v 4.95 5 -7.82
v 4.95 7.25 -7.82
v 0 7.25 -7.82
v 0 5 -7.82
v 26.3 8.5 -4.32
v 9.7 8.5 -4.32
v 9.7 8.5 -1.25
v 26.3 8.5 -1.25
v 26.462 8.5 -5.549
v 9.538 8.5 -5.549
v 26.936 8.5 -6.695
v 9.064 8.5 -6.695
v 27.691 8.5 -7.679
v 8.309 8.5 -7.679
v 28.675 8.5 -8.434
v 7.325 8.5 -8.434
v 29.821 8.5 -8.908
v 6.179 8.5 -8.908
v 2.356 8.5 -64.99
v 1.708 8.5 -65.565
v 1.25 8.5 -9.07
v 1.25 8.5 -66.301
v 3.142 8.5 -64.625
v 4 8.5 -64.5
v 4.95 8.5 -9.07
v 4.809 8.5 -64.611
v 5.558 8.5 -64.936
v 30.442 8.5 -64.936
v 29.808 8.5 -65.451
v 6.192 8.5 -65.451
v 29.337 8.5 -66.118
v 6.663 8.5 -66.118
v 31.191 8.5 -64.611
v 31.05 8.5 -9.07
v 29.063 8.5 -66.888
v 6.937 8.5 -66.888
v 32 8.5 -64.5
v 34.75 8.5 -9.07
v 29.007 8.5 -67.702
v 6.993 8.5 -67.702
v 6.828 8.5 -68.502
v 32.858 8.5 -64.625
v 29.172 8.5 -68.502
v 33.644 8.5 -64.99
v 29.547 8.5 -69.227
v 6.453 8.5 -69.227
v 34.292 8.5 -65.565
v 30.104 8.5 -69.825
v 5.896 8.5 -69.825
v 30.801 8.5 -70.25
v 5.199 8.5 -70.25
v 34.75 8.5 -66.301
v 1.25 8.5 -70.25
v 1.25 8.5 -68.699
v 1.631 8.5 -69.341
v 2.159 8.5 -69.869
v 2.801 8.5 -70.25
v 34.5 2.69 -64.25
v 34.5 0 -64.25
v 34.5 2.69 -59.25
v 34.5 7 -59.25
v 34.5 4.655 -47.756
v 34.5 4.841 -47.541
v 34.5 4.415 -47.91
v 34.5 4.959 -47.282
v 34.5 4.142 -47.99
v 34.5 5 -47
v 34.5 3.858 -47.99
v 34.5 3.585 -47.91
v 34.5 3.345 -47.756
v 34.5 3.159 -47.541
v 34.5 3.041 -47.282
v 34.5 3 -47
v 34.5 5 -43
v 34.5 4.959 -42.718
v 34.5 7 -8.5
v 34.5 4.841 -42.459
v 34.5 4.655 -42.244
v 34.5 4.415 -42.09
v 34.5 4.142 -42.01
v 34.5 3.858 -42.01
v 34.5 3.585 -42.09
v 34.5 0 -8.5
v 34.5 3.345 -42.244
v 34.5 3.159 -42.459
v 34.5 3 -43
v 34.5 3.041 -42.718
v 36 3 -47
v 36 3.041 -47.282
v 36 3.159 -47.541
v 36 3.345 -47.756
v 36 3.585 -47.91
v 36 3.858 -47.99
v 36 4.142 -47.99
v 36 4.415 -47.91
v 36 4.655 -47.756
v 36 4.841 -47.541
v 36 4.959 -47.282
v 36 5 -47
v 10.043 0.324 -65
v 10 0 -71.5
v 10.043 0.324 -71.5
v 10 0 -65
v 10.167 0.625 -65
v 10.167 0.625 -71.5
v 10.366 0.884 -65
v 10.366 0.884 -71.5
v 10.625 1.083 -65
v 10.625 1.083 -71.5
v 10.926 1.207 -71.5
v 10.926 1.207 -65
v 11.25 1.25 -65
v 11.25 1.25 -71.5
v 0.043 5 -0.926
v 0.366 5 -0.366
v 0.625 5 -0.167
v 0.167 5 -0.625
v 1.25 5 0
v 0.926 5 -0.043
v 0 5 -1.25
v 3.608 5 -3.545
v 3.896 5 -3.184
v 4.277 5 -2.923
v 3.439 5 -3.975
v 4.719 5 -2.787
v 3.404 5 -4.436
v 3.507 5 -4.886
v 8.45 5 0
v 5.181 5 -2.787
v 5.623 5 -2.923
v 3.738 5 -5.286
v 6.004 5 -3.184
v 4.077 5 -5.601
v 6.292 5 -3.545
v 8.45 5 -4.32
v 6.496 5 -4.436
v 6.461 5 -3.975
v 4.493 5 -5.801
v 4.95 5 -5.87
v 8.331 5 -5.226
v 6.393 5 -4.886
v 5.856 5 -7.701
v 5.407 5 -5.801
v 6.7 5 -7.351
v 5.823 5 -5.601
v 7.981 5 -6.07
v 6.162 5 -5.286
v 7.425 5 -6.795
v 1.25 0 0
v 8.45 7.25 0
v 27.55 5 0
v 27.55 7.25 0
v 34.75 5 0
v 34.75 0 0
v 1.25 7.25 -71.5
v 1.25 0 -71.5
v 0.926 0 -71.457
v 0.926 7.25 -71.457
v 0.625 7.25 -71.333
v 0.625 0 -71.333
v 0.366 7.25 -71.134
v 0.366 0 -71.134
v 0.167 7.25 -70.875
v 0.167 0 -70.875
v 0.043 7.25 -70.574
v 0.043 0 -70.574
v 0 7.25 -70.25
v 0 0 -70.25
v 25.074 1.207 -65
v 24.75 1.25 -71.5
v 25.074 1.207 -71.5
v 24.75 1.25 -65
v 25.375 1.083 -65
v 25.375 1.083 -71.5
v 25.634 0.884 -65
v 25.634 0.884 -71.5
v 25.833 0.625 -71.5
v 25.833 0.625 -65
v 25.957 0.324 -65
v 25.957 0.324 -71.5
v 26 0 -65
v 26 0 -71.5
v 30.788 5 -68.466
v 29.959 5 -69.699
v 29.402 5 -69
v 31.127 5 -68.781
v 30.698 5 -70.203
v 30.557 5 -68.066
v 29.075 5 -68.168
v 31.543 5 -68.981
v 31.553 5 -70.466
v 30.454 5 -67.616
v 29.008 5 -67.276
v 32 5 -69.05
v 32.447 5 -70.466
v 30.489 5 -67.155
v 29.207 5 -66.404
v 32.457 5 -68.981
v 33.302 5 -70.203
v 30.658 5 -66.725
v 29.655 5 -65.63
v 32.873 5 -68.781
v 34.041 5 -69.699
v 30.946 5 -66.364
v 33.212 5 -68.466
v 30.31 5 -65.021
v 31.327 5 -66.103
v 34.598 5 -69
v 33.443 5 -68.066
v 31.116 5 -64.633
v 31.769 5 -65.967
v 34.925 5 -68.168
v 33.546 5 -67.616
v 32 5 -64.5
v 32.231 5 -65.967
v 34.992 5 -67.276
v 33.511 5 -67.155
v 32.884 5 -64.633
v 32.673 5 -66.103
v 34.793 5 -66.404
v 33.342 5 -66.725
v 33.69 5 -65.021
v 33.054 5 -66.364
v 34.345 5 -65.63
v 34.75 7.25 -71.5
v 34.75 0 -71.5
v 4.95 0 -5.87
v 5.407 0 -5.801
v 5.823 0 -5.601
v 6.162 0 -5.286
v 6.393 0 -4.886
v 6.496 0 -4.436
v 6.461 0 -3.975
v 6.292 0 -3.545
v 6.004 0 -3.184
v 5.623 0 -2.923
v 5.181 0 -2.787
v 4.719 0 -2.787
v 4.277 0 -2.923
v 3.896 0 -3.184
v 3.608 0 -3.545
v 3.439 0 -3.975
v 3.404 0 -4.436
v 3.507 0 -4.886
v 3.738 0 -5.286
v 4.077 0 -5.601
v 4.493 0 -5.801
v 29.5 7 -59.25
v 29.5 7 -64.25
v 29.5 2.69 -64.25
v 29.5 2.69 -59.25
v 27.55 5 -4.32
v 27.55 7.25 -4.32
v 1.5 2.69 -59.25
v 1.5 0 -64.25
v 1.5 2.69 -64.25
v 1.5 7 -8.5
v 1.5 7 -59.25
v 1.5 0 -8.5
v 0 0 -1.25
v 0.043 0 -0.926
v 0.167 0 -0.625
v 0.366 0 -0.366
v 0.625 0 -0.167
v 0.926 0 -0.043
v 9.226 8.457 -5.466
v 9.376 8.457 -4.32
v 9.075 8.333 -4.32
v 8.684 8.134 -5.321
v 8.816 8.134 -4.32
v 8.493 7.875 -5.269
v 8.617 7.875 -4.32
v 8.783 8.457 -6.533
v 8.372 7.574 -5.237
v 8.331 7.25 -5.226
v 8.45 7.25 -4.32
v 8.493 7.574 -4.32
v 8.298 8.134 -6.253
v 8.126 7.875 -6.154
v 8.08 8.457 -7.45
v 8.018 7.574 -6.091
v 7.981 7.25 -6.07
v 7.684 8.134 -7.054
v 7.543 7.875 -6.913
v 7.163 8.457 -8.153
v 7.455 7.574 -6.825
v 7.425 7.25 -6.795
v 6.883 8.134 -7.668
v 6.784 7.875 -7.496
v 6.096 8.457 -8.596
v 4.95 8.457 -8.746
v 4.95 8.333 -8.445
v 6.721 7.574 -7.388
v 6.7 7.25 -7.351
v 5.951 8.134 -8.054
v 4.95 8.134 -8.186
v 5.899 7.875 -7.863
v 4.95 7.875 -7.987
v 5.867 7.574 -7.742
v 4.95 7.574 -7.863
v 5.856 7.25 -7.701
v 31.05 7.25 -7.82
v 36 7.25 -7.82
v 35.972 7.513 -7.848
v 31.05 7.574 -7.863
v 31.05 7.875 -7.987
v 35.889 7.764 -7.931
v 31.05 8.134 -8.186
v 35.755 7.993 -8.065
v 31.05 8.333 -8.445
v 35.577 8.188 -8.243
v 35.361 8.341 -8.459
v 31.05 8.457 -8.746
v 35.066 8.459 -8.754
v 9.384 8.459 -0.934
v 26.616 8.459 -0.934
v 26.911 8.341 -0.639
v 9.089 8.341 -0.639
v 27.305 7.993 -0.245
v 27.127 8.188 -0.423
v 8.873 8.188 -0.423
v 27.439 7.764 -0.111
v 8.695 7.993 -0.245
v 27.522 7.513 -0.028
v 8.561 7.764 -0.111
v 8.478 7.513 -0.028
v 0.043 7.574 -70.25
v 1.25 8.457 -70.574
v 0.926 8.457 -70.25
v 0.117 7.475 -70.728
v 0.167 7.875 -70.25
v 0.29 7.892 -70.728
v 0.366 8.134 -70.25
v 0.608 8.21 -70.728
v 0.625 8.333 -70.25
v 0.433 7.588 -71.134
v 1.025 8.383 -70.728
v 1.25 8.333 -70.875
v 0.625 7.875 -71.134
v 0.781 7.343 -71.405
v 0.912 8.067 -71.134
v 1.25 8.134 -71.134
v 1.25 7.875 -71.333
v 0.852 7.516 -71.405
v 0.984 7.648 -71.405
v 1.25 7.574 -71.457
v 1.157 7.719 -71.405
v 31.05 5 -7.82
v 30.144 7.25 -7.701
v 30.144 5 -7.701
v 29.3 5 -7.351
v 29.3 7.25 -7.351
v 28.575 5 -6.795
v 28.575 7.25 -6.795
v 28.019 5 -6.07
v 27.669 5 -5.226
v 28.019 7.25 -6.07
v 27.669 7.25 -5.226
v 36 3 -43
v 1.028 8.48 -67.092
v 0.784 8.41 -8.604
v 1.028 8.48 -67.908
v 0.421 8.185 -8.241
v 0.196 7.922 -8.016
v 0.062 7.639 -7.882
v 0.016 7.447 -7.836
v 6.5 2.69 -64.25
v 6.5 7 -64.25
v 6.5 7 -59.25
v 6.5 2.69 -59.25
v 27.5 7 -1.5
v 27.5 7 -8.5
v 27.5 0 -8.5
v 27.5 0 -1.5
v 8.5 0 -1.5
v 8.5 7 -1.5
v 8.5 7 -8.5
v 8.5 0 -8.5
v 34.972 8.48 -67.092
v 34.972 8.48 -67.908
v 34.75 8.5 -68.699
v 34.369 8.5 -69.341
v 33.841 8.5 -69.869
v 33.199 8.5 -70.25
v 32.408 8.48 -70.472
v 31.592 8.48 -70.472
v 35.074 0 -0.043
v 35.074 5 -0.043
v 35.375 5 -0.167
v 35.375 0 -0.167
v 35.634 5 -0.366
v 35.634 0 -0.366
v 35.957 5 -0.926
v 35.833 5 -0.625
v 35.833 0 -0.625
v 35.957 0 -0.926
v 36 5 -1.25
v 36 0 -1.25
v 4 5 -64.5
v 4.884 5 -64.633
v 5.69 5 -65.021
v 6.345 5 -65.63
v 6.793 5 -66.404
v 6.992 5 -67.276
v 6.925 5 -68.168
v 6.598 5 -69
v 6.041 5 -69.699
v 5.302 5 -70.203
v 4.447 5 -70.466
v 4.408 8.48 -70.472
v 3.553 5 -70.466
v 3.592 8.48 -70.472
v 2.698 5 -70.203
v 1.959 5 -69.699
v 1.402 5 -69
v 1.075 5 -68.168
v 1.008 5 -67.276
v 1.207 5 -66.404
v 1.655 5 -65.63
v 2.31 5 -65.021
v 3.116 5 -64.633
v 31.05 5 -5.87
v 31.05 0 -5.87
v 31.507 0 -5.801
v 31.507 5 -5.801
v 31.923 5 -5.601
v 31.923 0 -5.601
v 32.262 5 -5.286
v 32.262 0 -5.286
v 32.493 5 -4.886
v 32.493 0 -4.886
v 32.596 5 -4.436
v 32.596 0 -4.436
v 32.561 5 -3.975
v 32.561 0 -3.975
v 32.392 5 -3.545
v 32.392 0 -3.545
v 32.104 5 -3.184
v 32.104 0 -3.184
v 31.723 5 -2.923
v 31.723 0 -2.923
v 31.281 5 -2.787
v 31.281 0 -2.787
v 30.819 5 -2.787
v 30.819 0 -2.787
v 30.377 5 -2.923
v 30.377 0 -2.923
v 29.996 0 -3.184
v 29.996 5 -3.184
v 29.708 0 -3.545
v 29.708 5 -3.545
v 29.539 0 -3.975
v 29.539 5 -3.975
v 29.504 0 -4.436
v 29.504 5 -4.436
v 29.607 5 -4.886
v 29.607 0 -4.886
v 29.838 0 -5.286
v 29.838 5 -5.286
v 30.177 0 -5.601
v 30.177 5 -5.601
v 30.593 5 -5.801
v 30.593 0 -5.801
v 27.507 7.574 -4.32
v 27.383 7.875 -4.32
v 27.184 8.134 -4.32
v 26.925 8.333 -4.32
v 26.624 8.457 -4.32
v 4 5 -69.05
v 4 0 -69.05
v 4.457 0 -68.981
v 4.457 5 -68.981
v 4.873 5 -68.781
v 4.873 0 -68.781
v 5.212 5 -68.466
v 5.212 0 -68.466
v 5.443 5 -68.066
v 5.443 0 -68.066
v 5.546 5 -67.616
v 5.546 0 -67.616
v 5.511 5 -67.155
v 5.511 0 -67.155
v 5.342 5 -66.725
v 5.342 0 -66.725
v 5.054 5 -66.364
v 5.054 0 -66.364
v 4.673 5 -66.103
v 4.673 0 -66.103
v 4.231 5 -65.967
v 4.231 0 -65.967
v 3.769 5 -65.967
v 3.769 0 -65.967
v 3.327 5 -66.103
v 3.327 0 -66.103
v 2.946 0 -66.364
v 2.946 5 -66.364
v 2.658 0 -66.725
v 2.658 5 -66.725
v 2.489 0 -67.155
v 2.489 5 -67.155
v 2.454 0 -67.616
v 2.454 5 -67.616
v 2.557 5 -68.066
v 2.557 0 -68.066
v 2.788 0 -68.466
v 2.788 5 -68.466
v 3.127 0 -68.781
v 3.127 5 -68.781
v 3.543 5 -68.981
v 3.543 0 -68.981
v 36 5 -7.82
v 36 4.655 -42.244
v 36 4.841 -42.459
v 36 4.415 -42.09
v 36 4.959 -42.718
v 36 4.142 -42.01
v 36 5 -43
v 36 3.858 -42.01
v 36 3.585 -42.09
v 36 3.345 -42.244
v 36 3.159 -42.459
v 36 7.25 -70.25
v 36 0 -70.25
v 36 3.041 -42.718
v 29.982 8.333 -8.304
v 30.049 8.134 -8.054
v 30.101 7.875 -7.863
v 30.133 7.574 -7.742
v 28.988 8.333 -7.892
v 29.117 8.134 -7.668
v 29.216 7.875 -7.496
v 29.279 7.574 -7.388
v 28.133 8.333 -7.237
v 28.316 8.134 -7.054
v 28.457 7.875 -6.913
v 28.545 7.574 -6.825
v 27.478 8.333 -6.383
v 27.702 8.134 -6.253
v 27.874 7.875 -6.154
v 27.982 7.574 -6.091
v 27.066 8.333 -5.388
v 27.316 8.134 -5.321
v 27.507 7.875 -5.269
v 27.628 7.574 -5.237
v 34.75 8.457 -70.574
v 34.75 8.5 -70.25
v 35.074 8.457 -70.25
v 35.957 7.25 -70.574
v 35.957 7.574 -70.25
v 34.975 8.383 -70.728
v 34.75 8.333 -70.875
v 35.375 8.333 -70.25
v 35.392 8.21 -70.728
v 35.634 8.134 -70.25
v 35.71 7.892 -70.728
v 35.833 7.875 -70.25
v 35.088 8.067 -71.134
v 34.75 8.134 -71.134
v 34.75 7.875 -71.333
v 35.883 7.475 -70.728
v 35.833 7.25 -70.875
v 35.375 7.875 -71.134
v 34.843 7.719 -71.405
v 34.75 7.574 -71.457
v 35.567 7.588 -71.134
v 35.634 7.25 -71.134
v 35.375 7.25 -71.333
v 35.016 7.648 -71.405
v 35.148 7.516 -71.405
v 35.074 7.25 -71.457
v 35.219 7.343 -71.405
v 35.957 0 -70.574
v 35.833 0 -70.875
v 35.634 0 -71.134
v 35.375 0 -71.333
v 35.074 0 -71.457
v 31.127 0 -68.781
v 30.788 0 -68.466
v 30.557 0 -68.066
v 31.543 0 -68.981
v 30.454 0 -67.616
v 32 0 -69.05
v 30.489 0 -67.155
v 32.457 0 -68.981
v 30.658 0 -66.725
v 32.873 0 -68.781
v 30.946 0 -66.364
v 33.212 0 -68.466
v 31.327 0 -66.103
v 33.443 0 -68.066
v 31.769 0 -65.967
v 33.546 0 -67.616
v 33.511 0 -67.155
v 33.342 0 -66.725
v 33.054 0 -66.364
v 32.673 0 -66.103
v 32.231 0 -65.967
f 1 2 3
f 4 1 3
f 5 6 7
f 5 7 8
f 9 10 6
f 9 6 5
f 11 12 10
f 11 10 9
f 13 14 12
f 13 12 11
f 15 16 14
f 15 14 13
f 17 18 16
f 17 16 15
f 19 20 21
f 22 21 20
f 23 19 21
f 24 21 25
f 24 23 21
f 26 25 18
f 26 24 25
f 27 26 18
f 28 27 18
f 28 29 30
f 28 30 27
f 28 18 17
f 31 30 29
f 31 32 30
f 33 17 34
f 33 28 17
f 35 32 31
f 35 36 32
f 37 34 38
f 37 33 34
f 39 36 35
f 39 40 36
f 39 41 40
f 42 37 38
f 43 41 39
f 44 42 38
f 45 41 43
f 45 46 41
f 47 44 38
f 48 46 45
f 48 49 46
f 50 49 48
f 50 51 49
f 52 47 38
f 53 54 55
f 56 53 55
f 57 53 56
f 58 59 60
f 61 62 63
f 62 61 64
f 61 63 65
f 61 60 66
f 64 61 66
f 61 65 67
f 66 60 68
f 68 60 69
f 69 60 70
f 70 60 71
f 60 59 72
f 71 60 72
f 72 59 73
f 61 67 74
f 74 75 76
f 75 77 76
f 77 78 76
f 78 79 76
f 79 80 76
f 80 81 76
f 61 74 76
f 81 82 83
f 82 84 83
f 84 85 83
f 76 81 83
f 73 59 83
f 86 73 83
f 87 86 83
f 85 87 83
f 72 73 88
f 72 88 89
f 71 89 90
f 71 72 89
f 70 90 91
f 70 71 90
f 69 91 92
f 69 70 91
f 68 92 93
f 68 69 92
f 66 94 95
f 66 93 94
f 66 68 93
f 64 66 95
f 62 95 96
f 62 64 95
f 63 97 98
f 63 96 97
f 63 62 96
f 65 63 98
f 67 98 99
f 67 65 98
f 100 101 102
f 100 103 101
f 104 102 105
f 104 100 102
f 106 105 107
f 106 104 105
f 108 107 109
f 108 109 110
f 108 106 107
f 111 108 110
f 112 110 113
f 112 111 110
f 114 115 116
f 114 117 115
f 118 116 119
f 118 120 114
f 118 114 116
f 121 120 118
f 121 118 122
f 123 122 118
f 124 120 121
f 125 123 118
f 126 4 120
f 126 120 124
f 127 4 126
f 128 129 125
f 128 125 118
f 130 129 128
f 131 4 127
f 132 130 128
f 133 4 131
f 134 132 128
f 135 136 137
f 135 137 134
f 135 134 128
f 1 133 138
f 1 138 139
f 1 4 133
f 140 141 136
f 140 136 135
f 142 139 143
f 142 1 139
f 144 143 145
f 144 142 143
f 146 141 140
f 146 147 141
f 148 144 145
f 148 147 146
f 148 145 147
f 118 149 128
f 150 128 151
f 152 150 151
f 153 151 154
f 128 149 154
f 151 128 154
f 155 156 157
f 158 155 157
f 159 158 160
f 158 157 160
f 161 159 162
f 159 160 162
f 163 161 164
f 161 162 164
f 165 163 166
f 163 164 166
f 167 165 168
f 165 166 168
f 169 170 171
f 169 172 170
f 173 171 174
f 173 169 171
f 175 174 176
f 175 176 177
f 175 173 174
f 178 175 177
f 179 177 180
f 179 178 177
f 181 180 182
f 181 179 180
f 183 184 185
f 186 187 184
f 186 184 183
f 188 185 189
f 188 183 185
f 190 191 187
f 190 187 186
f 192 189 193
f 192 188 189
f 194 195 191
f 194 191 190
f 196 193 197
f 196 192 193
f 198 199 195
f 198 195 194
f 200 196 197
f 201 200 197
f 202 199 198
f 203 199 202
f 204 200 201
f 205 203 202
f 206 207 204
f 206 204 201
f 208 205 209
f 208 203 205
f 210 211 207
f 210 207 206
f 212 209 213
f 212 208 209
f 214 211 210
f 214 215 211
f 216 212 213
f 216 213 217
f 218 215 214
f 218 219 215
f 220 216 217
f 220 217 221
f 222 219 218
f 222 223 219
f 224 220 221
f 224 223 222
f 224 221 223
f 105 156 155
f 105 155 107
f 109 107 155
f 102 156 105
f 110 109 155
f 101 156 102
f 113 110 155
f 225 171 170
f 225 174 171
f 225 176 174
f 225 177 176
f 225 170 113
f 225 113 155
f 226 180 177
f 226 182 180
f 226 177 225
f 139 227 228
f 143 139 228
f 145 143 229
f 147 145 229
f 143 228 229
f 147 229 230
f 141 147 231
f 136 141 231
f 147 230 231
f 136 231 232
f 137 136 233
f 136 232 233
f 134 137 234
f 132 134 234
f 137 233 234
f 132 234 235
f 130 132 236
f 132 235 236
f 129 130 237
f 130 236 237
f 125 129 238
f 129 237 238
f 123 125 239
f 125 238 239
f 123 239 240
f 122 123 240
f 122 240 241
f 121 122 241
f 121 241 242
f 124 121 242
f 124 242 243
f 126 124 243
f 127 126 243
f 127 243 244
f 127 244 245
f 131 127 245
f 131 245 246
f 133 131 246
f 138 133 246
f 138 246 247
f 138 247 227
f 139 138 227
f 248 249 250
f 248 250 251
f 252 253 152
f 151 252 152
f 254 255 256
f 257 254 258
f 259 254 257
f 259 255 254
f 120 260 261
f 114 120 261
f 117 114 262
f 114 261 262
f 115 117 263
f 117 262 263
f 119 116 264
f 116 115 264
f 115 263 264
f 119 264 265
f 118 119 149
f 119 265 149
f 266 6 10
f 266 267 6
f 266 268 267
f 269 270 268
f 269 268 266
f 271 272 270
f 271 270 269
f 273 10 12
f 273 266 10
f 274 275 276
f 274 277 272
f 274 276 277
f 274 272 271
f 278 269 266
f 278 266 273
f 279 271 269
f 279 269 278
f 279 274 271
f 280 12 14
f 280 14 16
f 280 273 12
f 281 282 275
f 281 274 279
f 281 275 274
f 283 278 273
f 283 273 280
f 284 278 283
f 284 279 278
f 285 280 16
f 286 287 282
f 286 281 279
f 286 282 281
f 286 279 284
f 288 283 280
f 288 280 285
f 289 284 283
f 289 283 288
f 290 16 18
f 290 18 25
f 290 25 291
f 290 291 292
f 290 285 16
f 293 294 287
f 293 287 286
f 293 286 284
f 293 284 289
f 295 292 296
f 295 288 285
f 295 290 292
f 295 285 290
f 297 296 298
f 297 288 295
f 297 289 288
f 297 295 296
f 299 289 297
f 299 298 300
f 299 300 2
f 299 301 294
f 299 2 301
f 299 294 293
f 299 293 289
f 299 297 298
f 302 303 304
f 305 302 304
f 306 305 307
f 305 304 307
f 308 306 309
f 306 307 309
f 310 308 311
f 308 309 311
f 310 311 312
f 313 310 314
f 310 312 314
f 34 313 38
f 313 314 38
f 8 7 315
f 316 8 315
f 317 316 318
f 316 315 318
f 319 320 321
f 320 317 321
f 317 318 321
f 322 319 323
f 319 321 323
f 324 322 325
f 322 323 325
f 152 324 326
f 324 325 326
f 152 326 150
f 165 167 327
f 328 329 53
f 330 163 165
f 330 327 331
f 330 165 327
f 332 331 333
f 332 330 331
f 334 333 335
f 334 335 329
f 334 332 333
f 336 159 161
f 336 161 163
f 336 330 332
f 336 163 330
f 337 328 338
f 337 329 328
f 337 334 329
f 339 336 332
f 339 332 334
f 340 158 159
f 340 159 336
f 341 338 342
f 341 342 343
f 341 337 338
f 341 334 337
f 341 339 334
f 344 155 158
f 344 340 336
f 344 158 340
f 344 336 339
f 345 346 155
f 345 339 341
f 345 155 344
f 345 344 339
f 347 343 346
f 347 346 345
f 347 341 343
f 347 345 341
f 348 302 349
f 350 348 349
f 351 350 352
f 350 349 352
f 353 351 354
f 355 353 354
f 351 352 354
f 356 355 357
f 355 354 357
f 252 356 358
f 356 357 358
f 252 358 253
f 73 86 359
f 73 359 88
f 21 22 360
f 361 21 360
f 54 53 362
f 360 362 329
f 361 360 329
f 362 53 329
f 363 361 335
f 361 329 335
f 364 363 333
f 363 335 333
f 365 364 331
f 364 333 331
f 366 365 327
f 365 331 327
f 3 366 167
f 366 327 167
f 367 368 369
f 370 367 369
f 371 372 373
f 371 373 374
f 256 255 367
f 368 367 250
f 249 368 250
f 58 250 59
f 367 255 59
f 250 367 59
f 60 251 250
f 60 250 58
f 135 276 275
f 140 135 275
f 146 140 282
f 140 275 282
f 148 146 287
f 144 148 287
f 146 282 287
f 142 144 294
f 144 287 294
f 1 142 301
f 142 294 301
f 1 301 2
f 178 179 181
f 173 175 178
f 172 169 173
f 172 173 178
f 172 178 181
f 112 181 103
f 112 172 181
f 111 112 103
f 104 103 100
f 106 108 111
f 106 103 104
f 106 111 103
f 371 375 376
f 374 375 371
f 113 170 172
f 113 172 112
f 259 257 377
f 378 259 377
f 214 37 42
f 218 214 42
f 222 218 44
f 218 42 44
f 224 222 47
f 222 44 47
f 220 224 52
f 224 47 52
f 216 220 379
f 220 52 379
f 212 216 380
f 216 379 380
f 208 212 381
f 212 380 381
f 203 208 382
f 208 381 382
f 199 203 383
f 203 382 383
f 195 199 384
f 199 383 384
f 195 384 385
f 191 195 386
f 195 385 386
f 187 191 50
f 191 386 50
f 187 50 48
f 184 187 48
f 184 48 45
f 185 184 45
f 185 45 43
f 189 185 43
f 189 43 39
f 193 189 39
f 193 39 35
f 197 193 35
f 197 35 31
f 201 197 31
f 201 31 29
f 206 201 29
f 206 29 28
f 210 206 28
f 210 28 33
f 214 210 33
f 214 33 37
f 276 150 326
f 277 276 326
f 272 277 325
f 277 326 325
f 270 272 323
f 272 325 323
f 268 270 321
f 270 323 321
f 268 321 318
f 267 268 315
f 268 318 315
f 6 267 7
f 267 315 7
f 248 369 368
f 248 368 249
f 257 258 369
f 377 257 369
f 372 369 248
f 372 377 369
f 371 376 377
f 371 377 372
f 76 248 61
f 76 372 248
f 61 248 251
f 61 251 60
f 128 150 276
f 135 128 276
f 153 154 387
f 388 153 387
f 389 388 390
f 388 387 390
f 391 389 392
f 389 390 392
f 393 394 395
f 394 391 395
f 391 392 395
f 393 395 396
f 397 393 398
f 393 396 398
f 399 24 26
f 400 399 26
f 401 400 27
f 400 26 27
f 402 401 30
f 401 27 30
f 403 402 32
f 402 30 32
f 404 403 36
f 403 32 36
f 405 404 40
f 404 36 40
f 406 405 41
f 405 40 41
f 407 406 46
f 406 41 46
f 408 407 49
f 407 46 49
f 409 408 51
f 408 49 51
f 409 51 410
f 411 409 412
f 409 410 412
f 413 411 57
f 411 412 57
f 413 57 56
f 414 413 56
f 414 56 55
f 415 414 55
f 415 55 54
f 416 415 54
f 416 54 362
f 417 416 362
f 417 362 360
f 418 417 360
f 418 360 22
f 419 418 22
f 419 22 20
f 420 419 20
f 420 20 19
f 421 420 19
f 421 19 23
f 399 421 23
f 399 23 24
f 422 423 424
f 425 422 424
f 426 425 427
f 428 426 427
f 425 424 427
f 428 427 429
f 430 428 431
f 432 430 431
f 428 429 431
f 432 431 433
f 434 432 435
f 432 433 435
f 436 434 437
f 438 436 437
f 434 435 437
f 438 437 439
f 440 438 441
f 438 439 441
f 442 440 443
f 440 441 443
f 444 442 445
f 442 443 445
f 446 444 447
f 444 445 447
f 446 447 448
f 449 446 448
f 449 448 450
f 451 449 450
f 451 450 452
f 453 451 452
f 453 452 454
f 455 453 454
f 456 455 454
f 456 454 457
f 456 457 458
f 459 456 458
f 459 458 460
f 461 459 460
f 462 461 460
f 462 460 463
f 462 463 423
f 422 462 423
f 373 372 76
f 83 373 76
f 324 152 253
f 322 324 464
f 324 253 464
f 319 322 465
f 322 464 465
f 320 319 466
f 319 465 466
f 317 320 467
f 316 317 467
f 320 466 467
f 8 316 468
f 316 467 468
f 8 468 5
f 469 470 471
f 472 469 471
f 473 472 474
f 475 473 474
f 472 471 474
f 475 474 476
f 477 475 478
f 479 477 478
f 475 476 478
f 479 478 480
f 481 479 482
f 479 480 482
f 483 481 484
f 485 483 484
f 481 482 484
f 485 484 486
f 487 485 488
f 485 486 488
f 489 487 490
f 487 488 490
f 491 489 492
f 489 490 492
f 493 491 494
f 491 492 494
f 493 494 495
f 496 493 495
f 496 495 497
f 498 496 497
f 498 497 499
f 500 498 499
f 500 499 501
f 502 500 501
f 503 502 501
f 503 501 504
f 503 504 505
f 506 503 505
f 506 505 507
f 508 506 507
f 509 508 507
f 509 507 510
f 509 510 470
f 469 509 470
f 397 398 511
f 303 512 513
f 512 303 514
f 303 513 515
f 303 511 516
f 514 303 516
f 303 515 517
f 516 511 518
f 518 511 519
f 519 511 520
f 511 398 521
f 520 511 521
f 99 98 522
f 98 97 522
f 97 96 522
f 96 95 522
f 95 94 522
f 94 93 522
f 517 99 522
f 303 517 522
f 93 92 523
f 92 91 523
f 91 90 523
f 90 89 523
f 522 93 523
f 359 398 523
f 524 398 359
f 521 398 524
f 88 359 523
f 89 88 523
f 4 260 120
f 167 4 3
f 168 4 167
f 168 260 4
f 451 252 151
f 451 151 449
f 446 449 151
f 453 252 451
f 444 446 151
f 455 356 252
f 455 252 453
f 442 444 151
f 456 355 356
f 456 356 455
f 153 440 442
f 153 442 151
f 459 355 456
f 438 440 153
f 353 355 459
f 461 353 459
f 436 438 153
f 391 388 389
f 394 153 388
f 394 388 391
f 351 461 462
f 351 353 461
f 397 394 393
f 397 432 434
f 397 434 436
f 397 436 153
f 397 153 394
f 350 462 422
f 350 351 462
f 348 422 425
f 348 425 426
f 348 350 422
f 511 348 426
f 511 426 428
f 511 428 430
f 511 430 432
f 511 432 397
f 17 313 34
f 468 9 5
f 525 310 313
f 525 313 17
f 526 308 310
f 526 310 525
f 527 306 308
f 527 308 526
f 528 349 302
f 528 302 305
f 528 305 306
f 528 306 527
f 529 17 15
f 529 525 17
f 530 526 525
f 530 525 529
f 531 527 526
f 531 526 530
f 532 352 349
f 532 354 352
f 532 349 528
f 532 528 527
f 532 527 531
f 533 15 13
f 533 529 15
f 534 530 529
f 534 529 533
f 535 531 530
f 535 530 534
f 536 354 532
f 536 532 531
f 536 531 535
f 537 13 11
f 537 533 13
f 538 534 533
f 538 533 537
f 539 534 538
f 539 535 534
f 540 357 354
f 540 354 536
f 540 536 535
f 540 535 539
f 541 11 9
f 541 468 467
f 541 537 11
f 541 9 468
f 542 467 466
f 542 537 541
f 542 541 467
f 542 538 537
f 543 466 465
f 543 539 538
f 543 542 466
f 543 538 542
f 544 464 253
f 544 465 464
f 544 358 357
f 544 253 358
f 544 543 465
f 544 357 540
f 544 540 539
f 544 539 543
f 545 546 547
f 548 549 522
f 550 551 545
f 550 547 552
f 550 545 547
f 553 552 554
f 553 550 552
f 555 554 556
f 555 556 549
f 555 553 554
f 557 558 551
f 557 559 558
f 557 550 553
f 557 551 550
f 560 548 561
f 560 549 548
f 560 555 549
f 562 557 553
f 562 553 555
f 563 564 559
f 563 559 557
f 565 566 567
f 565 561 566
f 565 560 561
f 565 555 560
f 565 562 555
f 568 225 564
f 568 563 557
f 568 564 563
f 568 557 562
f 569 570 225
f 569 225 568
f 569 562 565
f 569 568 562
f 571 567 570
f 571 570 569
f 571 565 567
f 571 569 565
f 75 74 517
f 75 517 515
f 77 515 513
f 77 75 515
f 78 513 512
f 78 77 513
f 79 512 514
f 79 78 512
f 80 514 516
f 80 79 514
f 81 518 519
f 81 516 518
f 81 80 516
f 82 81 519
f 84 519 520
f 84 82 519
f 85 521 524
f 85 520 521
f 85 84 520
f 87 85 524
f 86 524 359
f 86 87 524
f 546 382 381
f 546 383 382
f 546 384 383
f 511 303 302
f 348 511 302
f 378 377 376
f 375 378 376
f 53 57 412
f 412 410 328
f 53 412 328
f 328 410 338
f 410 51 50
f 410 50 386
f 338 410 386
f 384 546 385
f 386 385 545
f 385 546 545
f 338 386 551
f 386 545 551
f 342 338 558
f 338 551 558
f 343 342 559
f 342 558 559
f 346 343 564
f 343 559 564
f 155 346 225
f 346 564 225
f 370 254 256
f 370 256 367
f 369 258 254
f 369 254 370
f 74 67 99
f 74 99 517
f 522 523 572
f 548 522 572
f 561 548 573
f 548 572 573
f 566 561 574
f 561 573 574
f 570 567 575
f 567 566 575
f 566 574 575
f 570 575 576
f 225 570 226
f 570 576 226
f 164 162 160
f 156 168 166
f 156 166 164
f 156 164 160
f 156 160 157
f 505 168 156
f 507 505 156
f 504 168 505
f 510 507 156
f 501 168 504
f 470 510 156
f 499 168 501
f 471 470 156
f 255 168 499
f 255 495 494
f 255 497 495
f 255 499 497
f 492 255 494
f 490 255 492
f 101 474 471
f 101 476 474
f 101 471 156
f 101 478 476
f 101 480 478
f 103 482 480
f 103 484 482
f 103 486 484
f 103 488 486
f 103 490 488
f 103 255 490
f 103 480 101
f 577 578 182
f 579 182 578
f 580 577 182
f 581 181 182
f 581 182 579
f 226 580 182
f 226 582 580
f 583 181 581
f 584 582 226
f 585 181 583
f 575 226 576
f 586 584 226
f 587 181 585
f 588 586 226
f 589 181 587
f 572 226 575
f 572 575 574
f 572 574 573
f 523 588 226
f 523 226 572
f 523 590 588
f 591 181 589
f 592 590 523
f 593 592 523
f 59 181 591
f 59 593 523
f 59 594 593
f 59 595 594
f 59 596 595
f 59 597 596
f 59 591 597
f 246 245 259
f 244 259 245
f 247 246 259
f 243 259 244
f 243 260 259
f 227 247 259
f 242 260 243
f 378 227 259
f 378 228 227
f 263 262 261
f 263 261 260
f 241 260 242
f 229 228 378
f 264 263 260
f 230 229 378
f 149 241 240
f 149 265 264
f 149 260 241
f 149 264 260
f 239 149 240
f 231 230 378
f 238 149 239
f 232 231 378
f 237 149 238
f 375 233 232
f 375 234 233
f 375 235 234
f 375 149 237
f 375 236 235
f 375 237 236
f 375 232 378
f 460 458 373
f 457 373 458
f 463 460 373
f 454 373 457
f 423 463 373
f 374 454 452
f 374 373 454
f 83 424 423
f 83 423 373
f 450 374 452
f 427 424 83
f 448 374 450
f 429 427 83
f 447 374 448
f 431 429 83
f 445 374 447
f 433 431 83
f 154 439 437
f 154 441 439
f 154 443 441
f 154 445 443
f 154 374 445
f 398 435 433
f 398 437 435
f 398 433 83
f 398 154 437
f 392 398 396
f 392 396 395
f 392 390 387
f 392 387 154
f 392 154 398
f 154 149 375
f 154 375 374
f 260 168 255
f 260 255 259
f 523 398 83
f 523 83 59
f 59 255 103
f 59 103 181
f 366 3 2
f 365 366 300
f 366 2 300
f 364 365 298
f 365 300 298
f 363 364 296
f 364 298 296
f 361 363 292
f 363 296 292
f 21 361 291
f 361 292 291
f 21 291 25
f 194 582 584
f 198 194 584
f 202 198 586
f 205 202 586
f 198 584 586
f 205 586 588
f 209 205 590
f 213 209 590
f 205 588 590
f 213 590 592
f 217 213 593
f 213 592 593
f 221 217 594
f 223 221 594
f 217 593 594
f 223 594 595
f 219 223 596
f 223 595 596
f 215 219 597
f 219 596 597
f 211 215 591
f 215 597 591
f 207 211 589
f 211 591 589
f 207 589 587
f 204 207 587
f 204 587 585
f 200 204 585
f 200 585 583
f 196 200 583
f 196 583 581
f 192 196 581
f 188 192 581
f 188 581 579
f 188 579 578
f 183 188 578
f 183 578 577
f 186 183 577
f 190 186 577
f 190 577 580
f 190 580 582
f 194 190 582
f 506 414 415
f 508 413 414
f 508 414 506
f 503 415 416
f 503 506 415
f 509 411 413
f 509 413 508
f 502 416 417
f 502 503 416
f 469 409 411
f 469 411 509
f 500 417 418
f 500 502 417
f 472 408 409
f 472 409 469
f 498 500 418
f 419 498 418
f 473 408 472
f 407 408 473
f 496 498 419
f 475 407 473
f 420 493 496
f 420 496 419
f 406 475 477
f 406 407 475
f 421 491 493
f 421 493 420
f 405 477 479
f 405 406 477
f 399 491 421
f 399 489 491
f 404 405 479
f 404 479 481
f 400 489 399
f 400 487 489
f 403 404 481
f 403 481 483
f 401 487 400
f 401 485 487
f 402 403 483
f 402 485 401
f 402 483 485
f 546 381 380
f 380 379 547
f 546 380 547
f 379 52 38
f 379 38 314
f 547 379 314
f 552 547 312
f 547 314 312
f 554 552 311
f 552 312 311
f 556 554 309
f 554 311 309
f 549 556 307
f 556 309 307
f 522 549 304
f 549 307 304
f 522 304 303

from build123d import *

# Parameters (mm, degrees)
SKETCH1_W           = 36
SKETCH1_H           = 71.5
BOSS_EXTRUDE1_DEPTH = 8.5
SKETCH2_W           = 33
SKETCH2_H           = 62.75
CUT_EXTRUDE1_DEPTH  = 7
SKETCH4_W           = 16
SKETCH4_H           = 1.25
CUT_EXTRUDE2_DEPTH  = 6.5
FILLET1_R           = 1.25
SKETCH7_W           = 7
SKETCH7_H           = 7
BOSS_EXTRUDE4_DEPTH = 7
SKETCH8_R           = 1.55
CUT_EXTRUDE3_DEPTH  = 81.50155278
SKETCH9_R           = 3
CUT_EXTRUDE4_DEPTH  = 3.5
CUT_EXTRUDE5_DEPTH  = 80.842031537
SKETCH11_W          = 5
SKETCH11_H          = 5
BOSS_EXTRUDE8_DEPTH = 4.31
FILLET2_R           = 1.25


# Some blends are built 0.0001 mm under size
with BuildPart() as part:
    # Sketch1 → Boss-Extrude1 (new body)
    with BuildSketch(Plane(origin=(0, 0, 0), x_dir=(1, 0, 0), z_dir=(0, 1, 0))):
        with Locations((18, 35.75)):
            Rectangle(SKETCH1_W, SKETCH1_H)
    extrude(amount=BOSS_EXTRUDE1_DEPTH)

    # Sketch2 → Cut-Extrude1 (cut)
    with BuildSketch(Plane.XZ):
        with Locations((18, -32.875)):
            Rectangle(SKETCH2_W, SKETCH2_H)
    extrude(amount=-CUT_EXTRUDE1_DEPTH, mode=Mode.SUBTRACT)

    # Sketch4 → Cut-Extrude2 (cut)
    with BuildSketch(Plane(origin=(0, 0, -71.5), x_dir=(-1, 0, 0), z_dir=(0, 0, -1))):
        with Locations((-18, 0.625)):
            Rectangle(SKETCH4_W, SKETCH4_H)
    extrude(amount=-CUT_EXTRUDE2_DEPTH, mode=Mode.SUBTRACT)

    # Fillet1
    fillet1_edges = [part.edges().sort_by_distance(p)[0] for p in [
        (26, 1.25, -68.25),
        (10, 1.25, -68.25),
    ]]
    fillet(fillet1_edges, radius=FILLET1_R - 0.0001)  # a hair under: the kernel refuses the full size

    # Sketch7 → Boss-Extrude4 (add)
    with BuildSketch(Plane.XZ.offset(-7)):
        with Locations((31, -5)):
            Rectangle(SKETCH7_W, SKETCH7_H)
        with Locations((5, -5)):
            Rectangle(SKETCH7_W, SKETCH7_H)
    extrude(amount=BOSS_EXTRUDE4_DEPTH)

    # Sketch8 → Cut-Extrude3 (cut, through all)
    with BuildSketch(Plane(origin=(0, 0, 0), x_dir=(-1, 0, 0), z_dir=(0, -1, 0))):
        with Locations(Location((-31.05, 4.32, 0), (0, 0, 90))):
            Circle(SKETCH8_R)
        with Locations(Location((-32, 67.5, 0), (0, 0, 90))):
            Circle(SKETCH8_R)
        with Locations(Location((-4, 67.5, 0), (0, 0, 90))):
            Circle(SKETCH8_R)
        with Locations(Location((-4.95, 4.32, 0), (0, 0, 90))):
            Circle(SKETCH8_R)
    extrude(amount=-CUT_EXTRUDE3_DEPTH, mode=Mode.SUBTRACT)

    # Sketch9 → Cut-Extrude4 (cut)
    with BuildSketch(Plane(origin=(0, 8.5, 0), x_dir=(1, 0, 0), z_dir=(0, 1, 0))):
        with Locations(Location((4, 67.5, 0), (0, 0, 270))):
            Circle(SKETCH9_R)
        with Locations(Location((32, 67.5, 0), (0, 0, 270))):
            Circle(SKETCH9_R)
        with BuildLine():
            Line((4.95, 7.82), (0, 7.82))
            Line((0, 7.82), (0, 0))
            Line((0, 0), (8.45, 0))
            Line((8.45, 0), (8.45, 4.32))
            ThreePointArc((8.45, 4.32), (7.424873734, 6.794873734), (4.95, 7.82))
        make_face()
        with BuildLine():
            Line((27.55, 4.32), (27.55, 0))
            Line((27.55, 0), (36, 0))
            Line((36, 0), (36, 7.82))
            Line((36, 7.82), (31.05, 7.82))
            ThreePointArc((31.05, 7.82), (28.575126266, 6.794873734), (27.55, 4.32))
        make_face()
    extrude(amount=-CUT_EXTRUDE4_DEPTH, mode=Mode.SUBTRACT)

    # Sketch10 → Cut-Extrude5 (cut, through all)
    with BuildSketch(Plane.ZY.offset(-34.5)):
        with BuildLine():
            Line((-47, 5), (-43, 5))
            ThreePointArc((-43, 5), (-42, 4), (-43, 3))
            Line((-43, 3), (-47, 3))
            ThreePointArc((-47, 3), (-48, 4), (-47, 5))
        make_face()
    extrude(amount=-CUT_EXTRUDE5_DEPTH, mode=Mode.SUBTRACT)

    # Sketch11 → Boss-Extrude8 (add)
    with BuildSketch(Plane.XZ.offset(-7)):
        with Locations((4, -61.75)):
            Rectangle(SKETCH11_W, SKETCH11_H)
        with Locations((32, -61.75)):
            Rectangle(SKETCH11_W, SKETCH11_H)
    extrude(amount=BOSS_EXTRUDE8_DEPTH)

    # Fillet2
    # the kernel refuses this fillet: 1.25 mm, written as the material it takes off along each edge
    with BuildSketch(Plane(origin=(34.75, 7.25, -70.25), x_dir=(1, 0, 0), z_dir=(0, 0, -1))) as fillet2_piece_1_section:
        Polygon((0, 0), (FILLET2_R, 0), (FILLET2_R, -FILLET2_R), (0, -FILLET2_R), align=None)
    fillet2_piece_1 = extrude(amount=FILLET2_R, mode=Mode.PRIVATE)
    fillet2_piece_1 = fillet2_piece_1 - Plane(origin=(34.75, 7.25, -70.25), x_dir=(-0.7071067811865475, -0.7071067811865475, 0), z_dir=(0, 0, -1)) * Sphere(FILLET2_R, mode=Mode.PRIVATE)
    add(fillet2_piece_1, mode=Mode.SUBTRACT)
    with BuildSketch(Plane(origin=(1.25, 7.25, -70.25), x_dir=(-1, 0, 0), z_dir=(0, 0, -1))) as fillet2_piece_2_section:
        Polygon((0, 0), (FILLET2_R, 0), (FILLET2_R, FILLET2_R), (0, FILLET2_R), align=None)
    fillet2_piece_2 = extrude(amount=FILLET2_R, mode=Mode.PRIVATE)
    fillet2_piece_2 = fillet2_piece_2 - Plane(origin=(1.25, 7.25, -70.25), x_dir=(0.7071067811865475, -0.7071067811865475, 0), z_dir=(0, 0, -1)) * Sphere(FILLET2_R, mode=Mode.PRIVATE)
    add(fillet2_piece_2, mode=Mode.SUBTRACT)
    with BuildSketch(Plane(origin=(5.325, 8.5, 0), x_dir=(0, 0, -1), z_dir=(1, 0, 0))) as fillet2_piece_3:
        with BuildLine():
            CenterArc((FILLET2_R, -FILLET2_R), FILLET2_R, 90, 90)
            Line((0, -FILLET2_R), (0, 0))
            Line((0, 0), (FILLET2_R, 0))
        make_face()
    extrude(amount=25.35, mode=Mode.SUBTRACT)
    with BuildSketch(Plane(origin=(36, 8.5, -4.695), x_dir=(0, -1, 0), z_dir=(0, 0, -1))) as fillet2_piece_4:
        with BuildLine():
            CenterArc((FILLET2_R, FILLET2_R), FILLET2_R, 180, 90)
            Line((0, FILLET2_R), (0, 0))
            Line((0, 0), (FILLET2_R, 0))
        make_face()
    extrude(amount=65.555, mode=Mode.SUBTRACT)
    with BuildSketch(Plane(origin=(36, -3.125, 0), x_dir=(0, 0, -1), z_dir=(0, 1, 0))) as fillet2_piece_5:
        with BuildLine():
            CenterArc((FILLET2_R, FILLET2_R), FILLET2_R, 180, 90)
            Line((0, FILLET2_R), (0, 0))
            Line((0, 0), (FILLET2_R, 0))
        make_face()
    extrude(amount=11.25, mode=Mode.SUBTRACT)
    with BuildSketch(Plane(origin=(0, -3.125, 0), x_dir=(0, 0, -1), z_dir=(0, 1, 0))) as fillet2_piece_6:
        with BuildLine():
            CenterArc((FILLET2_R, -FILLET2_R), FILLET2_R, 90, 90)
            Line((0, -FILLET2_R), (0, 0))
            Line((0, 0), (FILLET2_R, 0))
        make_face()
    extrude(amount=11.25, mode=Mode.SUBTRACT)
    with BuildSketch(Plane(origin=(4.95, 8.5, -4.32), x_dir=(1, 0, 0), z_dir=(0, 0, 1))) as fillet2_piece_7:
        with BuildLine():
            CenterArc((3.5 + FILLET2_R, -FILLET2_R), FILLET2_R, 90, 90)
            Line((3.5, -FILLET2_R), (3.5, 0))
            Line((3.5, 0), (3.5 + FILLET2_R, 0))
        make_face()
    revolve(axis=Axis((4.95, 8.5, -4.32), (0, 1, 0)), revolution_arc=90, mode=Mode.SUBTRACT)
    with BuildSketch(Plane(origin=(4.95, 8.5, -7.82), x_dir=(0, 0, -1), z_dir=(-1, 0, 0)), Plane(origin=(39.125, 8.5, -7.82), x_dir=(0, 0, -1), z_dir=(-1, 0, 0))) as fillet2_piece_8:
        with BuildLine():
            CenterArc((FILLET2_R, FILLET2_R), FILLET2_R, 180, 90)
            Line((0, FILLET2_R), (0, 0))
            Line((0, 0), (FILLET2_R, 0))
        make_face()
    extrude(amount=8.075, mode=Mode.SUBTRACT)
    with BuildSketch(Plane(origin=(8.45, 8.5, 3.125), x_dir=(1, 0, 0), z_dir=(0, 0, -1)), Plane(origin=(27.55, 8.5, -4.32), x_dir=(-1, 0, 0), z_dir=(0, 0, 1))) as fillet2_piece_9:
        with BuildLine():
            CenterArc((FILLET2_R, FILLET2_R), FILLET2_R, 180, 90)
            Line((0, FILLET2_R), (0, 0))
            Line((0, 0), (FILLET2_R, 0))
        make_face()
    extrude(amount=7.445, mode=Mode.SUBTRACT)
    with BuildSketch(Plane(origin=(31.05, 8.5, -4.32), x_dir=(0, 0, -1), z_dir=(1, 0, 0))) as fillet2_piece_10:
        with BuildLine():
            CenterArc((3.5 + FILLET2_R, -FILLET2_R), FILLET2_R, 90, 90)
            Line((3.5, -FILLET2_R), (3.5, 0))
            Line((3.5, 0), (3.5 + FILLET2_R, 0))
        make_face()
    revolve(axis=Axis((31.05, 8.5, -4.32), (0, 1, 0)), revolution_arc=90, mode=Mode.SUBTRACT)
    with BuildSketch(Plane(origin=(34.75, 8.5, -71.5), x_dir=(0, -1, 0), z_dir=(-1, 0, 0))) as fillet2_piece_11:
        with BuildLine():
            CenterArc((FILLET2_R, FILLET2_R), FILLET2_R, 180, 90)
            Line((0, FILLET2_R), (0, 0))
            Line((0, 0), (FILLET2_R, 0))
        make_face()
    extrude(amount=33.5, mode=Mode.SUBTRACT)
    with BuildSketch(Plane(origin=(0, 8.5, -70.25), x_dir=(1, 0, 0), z_dir=(0, 0, 1))) as fillet2_piece_12:
        with BuildLine():
            CenterArc((FILLET2_R, -FILLET2_R), FILLET2_R, 90, 90)
            Line((0, -FILLET2_R), (0, 0))
            Line((0, 0), (FILLET2_R, 0))
        make_face()
    extrude(amount=65.555, mode=Mode.SUBTRACT)
    with BuildSketch(Plane(origin=(0, -3.125, -71.5), x_dir=(1, 0, 0), z_dir=(0, 1, 0))) as fillet2_piece_13:
        with BuildLine():
            CenterArc((FILLET2_R, -FILLET2_R), FILLET2_R, 90, 90)
            Line((0, -FILLET2_R), (0, 0))
            Line((0, 0), (FILLET2_R, 0))
        make_face()
    extrude(amount=10.375, mode=Mode.SUBTRACT)
    with BuildSketch(Plane(origin=(36, -3.125, -71.5), x_dir=(-1, 0, 0), z_dir=(0, 1, 0))) as fillet2_piece_14:
        with BuildLine():
            CenterArc((FILLET2_R, FILLET2_R), FILLET2_R, 180, 90)
            Line((0, FILLET2_R), (0, 0))
            Line((0, 0), (FILLET2_R, 0))
        make_face()
    extrude(amount=10.375, mode=Mode.SUBTRACT)


solid = part.part
